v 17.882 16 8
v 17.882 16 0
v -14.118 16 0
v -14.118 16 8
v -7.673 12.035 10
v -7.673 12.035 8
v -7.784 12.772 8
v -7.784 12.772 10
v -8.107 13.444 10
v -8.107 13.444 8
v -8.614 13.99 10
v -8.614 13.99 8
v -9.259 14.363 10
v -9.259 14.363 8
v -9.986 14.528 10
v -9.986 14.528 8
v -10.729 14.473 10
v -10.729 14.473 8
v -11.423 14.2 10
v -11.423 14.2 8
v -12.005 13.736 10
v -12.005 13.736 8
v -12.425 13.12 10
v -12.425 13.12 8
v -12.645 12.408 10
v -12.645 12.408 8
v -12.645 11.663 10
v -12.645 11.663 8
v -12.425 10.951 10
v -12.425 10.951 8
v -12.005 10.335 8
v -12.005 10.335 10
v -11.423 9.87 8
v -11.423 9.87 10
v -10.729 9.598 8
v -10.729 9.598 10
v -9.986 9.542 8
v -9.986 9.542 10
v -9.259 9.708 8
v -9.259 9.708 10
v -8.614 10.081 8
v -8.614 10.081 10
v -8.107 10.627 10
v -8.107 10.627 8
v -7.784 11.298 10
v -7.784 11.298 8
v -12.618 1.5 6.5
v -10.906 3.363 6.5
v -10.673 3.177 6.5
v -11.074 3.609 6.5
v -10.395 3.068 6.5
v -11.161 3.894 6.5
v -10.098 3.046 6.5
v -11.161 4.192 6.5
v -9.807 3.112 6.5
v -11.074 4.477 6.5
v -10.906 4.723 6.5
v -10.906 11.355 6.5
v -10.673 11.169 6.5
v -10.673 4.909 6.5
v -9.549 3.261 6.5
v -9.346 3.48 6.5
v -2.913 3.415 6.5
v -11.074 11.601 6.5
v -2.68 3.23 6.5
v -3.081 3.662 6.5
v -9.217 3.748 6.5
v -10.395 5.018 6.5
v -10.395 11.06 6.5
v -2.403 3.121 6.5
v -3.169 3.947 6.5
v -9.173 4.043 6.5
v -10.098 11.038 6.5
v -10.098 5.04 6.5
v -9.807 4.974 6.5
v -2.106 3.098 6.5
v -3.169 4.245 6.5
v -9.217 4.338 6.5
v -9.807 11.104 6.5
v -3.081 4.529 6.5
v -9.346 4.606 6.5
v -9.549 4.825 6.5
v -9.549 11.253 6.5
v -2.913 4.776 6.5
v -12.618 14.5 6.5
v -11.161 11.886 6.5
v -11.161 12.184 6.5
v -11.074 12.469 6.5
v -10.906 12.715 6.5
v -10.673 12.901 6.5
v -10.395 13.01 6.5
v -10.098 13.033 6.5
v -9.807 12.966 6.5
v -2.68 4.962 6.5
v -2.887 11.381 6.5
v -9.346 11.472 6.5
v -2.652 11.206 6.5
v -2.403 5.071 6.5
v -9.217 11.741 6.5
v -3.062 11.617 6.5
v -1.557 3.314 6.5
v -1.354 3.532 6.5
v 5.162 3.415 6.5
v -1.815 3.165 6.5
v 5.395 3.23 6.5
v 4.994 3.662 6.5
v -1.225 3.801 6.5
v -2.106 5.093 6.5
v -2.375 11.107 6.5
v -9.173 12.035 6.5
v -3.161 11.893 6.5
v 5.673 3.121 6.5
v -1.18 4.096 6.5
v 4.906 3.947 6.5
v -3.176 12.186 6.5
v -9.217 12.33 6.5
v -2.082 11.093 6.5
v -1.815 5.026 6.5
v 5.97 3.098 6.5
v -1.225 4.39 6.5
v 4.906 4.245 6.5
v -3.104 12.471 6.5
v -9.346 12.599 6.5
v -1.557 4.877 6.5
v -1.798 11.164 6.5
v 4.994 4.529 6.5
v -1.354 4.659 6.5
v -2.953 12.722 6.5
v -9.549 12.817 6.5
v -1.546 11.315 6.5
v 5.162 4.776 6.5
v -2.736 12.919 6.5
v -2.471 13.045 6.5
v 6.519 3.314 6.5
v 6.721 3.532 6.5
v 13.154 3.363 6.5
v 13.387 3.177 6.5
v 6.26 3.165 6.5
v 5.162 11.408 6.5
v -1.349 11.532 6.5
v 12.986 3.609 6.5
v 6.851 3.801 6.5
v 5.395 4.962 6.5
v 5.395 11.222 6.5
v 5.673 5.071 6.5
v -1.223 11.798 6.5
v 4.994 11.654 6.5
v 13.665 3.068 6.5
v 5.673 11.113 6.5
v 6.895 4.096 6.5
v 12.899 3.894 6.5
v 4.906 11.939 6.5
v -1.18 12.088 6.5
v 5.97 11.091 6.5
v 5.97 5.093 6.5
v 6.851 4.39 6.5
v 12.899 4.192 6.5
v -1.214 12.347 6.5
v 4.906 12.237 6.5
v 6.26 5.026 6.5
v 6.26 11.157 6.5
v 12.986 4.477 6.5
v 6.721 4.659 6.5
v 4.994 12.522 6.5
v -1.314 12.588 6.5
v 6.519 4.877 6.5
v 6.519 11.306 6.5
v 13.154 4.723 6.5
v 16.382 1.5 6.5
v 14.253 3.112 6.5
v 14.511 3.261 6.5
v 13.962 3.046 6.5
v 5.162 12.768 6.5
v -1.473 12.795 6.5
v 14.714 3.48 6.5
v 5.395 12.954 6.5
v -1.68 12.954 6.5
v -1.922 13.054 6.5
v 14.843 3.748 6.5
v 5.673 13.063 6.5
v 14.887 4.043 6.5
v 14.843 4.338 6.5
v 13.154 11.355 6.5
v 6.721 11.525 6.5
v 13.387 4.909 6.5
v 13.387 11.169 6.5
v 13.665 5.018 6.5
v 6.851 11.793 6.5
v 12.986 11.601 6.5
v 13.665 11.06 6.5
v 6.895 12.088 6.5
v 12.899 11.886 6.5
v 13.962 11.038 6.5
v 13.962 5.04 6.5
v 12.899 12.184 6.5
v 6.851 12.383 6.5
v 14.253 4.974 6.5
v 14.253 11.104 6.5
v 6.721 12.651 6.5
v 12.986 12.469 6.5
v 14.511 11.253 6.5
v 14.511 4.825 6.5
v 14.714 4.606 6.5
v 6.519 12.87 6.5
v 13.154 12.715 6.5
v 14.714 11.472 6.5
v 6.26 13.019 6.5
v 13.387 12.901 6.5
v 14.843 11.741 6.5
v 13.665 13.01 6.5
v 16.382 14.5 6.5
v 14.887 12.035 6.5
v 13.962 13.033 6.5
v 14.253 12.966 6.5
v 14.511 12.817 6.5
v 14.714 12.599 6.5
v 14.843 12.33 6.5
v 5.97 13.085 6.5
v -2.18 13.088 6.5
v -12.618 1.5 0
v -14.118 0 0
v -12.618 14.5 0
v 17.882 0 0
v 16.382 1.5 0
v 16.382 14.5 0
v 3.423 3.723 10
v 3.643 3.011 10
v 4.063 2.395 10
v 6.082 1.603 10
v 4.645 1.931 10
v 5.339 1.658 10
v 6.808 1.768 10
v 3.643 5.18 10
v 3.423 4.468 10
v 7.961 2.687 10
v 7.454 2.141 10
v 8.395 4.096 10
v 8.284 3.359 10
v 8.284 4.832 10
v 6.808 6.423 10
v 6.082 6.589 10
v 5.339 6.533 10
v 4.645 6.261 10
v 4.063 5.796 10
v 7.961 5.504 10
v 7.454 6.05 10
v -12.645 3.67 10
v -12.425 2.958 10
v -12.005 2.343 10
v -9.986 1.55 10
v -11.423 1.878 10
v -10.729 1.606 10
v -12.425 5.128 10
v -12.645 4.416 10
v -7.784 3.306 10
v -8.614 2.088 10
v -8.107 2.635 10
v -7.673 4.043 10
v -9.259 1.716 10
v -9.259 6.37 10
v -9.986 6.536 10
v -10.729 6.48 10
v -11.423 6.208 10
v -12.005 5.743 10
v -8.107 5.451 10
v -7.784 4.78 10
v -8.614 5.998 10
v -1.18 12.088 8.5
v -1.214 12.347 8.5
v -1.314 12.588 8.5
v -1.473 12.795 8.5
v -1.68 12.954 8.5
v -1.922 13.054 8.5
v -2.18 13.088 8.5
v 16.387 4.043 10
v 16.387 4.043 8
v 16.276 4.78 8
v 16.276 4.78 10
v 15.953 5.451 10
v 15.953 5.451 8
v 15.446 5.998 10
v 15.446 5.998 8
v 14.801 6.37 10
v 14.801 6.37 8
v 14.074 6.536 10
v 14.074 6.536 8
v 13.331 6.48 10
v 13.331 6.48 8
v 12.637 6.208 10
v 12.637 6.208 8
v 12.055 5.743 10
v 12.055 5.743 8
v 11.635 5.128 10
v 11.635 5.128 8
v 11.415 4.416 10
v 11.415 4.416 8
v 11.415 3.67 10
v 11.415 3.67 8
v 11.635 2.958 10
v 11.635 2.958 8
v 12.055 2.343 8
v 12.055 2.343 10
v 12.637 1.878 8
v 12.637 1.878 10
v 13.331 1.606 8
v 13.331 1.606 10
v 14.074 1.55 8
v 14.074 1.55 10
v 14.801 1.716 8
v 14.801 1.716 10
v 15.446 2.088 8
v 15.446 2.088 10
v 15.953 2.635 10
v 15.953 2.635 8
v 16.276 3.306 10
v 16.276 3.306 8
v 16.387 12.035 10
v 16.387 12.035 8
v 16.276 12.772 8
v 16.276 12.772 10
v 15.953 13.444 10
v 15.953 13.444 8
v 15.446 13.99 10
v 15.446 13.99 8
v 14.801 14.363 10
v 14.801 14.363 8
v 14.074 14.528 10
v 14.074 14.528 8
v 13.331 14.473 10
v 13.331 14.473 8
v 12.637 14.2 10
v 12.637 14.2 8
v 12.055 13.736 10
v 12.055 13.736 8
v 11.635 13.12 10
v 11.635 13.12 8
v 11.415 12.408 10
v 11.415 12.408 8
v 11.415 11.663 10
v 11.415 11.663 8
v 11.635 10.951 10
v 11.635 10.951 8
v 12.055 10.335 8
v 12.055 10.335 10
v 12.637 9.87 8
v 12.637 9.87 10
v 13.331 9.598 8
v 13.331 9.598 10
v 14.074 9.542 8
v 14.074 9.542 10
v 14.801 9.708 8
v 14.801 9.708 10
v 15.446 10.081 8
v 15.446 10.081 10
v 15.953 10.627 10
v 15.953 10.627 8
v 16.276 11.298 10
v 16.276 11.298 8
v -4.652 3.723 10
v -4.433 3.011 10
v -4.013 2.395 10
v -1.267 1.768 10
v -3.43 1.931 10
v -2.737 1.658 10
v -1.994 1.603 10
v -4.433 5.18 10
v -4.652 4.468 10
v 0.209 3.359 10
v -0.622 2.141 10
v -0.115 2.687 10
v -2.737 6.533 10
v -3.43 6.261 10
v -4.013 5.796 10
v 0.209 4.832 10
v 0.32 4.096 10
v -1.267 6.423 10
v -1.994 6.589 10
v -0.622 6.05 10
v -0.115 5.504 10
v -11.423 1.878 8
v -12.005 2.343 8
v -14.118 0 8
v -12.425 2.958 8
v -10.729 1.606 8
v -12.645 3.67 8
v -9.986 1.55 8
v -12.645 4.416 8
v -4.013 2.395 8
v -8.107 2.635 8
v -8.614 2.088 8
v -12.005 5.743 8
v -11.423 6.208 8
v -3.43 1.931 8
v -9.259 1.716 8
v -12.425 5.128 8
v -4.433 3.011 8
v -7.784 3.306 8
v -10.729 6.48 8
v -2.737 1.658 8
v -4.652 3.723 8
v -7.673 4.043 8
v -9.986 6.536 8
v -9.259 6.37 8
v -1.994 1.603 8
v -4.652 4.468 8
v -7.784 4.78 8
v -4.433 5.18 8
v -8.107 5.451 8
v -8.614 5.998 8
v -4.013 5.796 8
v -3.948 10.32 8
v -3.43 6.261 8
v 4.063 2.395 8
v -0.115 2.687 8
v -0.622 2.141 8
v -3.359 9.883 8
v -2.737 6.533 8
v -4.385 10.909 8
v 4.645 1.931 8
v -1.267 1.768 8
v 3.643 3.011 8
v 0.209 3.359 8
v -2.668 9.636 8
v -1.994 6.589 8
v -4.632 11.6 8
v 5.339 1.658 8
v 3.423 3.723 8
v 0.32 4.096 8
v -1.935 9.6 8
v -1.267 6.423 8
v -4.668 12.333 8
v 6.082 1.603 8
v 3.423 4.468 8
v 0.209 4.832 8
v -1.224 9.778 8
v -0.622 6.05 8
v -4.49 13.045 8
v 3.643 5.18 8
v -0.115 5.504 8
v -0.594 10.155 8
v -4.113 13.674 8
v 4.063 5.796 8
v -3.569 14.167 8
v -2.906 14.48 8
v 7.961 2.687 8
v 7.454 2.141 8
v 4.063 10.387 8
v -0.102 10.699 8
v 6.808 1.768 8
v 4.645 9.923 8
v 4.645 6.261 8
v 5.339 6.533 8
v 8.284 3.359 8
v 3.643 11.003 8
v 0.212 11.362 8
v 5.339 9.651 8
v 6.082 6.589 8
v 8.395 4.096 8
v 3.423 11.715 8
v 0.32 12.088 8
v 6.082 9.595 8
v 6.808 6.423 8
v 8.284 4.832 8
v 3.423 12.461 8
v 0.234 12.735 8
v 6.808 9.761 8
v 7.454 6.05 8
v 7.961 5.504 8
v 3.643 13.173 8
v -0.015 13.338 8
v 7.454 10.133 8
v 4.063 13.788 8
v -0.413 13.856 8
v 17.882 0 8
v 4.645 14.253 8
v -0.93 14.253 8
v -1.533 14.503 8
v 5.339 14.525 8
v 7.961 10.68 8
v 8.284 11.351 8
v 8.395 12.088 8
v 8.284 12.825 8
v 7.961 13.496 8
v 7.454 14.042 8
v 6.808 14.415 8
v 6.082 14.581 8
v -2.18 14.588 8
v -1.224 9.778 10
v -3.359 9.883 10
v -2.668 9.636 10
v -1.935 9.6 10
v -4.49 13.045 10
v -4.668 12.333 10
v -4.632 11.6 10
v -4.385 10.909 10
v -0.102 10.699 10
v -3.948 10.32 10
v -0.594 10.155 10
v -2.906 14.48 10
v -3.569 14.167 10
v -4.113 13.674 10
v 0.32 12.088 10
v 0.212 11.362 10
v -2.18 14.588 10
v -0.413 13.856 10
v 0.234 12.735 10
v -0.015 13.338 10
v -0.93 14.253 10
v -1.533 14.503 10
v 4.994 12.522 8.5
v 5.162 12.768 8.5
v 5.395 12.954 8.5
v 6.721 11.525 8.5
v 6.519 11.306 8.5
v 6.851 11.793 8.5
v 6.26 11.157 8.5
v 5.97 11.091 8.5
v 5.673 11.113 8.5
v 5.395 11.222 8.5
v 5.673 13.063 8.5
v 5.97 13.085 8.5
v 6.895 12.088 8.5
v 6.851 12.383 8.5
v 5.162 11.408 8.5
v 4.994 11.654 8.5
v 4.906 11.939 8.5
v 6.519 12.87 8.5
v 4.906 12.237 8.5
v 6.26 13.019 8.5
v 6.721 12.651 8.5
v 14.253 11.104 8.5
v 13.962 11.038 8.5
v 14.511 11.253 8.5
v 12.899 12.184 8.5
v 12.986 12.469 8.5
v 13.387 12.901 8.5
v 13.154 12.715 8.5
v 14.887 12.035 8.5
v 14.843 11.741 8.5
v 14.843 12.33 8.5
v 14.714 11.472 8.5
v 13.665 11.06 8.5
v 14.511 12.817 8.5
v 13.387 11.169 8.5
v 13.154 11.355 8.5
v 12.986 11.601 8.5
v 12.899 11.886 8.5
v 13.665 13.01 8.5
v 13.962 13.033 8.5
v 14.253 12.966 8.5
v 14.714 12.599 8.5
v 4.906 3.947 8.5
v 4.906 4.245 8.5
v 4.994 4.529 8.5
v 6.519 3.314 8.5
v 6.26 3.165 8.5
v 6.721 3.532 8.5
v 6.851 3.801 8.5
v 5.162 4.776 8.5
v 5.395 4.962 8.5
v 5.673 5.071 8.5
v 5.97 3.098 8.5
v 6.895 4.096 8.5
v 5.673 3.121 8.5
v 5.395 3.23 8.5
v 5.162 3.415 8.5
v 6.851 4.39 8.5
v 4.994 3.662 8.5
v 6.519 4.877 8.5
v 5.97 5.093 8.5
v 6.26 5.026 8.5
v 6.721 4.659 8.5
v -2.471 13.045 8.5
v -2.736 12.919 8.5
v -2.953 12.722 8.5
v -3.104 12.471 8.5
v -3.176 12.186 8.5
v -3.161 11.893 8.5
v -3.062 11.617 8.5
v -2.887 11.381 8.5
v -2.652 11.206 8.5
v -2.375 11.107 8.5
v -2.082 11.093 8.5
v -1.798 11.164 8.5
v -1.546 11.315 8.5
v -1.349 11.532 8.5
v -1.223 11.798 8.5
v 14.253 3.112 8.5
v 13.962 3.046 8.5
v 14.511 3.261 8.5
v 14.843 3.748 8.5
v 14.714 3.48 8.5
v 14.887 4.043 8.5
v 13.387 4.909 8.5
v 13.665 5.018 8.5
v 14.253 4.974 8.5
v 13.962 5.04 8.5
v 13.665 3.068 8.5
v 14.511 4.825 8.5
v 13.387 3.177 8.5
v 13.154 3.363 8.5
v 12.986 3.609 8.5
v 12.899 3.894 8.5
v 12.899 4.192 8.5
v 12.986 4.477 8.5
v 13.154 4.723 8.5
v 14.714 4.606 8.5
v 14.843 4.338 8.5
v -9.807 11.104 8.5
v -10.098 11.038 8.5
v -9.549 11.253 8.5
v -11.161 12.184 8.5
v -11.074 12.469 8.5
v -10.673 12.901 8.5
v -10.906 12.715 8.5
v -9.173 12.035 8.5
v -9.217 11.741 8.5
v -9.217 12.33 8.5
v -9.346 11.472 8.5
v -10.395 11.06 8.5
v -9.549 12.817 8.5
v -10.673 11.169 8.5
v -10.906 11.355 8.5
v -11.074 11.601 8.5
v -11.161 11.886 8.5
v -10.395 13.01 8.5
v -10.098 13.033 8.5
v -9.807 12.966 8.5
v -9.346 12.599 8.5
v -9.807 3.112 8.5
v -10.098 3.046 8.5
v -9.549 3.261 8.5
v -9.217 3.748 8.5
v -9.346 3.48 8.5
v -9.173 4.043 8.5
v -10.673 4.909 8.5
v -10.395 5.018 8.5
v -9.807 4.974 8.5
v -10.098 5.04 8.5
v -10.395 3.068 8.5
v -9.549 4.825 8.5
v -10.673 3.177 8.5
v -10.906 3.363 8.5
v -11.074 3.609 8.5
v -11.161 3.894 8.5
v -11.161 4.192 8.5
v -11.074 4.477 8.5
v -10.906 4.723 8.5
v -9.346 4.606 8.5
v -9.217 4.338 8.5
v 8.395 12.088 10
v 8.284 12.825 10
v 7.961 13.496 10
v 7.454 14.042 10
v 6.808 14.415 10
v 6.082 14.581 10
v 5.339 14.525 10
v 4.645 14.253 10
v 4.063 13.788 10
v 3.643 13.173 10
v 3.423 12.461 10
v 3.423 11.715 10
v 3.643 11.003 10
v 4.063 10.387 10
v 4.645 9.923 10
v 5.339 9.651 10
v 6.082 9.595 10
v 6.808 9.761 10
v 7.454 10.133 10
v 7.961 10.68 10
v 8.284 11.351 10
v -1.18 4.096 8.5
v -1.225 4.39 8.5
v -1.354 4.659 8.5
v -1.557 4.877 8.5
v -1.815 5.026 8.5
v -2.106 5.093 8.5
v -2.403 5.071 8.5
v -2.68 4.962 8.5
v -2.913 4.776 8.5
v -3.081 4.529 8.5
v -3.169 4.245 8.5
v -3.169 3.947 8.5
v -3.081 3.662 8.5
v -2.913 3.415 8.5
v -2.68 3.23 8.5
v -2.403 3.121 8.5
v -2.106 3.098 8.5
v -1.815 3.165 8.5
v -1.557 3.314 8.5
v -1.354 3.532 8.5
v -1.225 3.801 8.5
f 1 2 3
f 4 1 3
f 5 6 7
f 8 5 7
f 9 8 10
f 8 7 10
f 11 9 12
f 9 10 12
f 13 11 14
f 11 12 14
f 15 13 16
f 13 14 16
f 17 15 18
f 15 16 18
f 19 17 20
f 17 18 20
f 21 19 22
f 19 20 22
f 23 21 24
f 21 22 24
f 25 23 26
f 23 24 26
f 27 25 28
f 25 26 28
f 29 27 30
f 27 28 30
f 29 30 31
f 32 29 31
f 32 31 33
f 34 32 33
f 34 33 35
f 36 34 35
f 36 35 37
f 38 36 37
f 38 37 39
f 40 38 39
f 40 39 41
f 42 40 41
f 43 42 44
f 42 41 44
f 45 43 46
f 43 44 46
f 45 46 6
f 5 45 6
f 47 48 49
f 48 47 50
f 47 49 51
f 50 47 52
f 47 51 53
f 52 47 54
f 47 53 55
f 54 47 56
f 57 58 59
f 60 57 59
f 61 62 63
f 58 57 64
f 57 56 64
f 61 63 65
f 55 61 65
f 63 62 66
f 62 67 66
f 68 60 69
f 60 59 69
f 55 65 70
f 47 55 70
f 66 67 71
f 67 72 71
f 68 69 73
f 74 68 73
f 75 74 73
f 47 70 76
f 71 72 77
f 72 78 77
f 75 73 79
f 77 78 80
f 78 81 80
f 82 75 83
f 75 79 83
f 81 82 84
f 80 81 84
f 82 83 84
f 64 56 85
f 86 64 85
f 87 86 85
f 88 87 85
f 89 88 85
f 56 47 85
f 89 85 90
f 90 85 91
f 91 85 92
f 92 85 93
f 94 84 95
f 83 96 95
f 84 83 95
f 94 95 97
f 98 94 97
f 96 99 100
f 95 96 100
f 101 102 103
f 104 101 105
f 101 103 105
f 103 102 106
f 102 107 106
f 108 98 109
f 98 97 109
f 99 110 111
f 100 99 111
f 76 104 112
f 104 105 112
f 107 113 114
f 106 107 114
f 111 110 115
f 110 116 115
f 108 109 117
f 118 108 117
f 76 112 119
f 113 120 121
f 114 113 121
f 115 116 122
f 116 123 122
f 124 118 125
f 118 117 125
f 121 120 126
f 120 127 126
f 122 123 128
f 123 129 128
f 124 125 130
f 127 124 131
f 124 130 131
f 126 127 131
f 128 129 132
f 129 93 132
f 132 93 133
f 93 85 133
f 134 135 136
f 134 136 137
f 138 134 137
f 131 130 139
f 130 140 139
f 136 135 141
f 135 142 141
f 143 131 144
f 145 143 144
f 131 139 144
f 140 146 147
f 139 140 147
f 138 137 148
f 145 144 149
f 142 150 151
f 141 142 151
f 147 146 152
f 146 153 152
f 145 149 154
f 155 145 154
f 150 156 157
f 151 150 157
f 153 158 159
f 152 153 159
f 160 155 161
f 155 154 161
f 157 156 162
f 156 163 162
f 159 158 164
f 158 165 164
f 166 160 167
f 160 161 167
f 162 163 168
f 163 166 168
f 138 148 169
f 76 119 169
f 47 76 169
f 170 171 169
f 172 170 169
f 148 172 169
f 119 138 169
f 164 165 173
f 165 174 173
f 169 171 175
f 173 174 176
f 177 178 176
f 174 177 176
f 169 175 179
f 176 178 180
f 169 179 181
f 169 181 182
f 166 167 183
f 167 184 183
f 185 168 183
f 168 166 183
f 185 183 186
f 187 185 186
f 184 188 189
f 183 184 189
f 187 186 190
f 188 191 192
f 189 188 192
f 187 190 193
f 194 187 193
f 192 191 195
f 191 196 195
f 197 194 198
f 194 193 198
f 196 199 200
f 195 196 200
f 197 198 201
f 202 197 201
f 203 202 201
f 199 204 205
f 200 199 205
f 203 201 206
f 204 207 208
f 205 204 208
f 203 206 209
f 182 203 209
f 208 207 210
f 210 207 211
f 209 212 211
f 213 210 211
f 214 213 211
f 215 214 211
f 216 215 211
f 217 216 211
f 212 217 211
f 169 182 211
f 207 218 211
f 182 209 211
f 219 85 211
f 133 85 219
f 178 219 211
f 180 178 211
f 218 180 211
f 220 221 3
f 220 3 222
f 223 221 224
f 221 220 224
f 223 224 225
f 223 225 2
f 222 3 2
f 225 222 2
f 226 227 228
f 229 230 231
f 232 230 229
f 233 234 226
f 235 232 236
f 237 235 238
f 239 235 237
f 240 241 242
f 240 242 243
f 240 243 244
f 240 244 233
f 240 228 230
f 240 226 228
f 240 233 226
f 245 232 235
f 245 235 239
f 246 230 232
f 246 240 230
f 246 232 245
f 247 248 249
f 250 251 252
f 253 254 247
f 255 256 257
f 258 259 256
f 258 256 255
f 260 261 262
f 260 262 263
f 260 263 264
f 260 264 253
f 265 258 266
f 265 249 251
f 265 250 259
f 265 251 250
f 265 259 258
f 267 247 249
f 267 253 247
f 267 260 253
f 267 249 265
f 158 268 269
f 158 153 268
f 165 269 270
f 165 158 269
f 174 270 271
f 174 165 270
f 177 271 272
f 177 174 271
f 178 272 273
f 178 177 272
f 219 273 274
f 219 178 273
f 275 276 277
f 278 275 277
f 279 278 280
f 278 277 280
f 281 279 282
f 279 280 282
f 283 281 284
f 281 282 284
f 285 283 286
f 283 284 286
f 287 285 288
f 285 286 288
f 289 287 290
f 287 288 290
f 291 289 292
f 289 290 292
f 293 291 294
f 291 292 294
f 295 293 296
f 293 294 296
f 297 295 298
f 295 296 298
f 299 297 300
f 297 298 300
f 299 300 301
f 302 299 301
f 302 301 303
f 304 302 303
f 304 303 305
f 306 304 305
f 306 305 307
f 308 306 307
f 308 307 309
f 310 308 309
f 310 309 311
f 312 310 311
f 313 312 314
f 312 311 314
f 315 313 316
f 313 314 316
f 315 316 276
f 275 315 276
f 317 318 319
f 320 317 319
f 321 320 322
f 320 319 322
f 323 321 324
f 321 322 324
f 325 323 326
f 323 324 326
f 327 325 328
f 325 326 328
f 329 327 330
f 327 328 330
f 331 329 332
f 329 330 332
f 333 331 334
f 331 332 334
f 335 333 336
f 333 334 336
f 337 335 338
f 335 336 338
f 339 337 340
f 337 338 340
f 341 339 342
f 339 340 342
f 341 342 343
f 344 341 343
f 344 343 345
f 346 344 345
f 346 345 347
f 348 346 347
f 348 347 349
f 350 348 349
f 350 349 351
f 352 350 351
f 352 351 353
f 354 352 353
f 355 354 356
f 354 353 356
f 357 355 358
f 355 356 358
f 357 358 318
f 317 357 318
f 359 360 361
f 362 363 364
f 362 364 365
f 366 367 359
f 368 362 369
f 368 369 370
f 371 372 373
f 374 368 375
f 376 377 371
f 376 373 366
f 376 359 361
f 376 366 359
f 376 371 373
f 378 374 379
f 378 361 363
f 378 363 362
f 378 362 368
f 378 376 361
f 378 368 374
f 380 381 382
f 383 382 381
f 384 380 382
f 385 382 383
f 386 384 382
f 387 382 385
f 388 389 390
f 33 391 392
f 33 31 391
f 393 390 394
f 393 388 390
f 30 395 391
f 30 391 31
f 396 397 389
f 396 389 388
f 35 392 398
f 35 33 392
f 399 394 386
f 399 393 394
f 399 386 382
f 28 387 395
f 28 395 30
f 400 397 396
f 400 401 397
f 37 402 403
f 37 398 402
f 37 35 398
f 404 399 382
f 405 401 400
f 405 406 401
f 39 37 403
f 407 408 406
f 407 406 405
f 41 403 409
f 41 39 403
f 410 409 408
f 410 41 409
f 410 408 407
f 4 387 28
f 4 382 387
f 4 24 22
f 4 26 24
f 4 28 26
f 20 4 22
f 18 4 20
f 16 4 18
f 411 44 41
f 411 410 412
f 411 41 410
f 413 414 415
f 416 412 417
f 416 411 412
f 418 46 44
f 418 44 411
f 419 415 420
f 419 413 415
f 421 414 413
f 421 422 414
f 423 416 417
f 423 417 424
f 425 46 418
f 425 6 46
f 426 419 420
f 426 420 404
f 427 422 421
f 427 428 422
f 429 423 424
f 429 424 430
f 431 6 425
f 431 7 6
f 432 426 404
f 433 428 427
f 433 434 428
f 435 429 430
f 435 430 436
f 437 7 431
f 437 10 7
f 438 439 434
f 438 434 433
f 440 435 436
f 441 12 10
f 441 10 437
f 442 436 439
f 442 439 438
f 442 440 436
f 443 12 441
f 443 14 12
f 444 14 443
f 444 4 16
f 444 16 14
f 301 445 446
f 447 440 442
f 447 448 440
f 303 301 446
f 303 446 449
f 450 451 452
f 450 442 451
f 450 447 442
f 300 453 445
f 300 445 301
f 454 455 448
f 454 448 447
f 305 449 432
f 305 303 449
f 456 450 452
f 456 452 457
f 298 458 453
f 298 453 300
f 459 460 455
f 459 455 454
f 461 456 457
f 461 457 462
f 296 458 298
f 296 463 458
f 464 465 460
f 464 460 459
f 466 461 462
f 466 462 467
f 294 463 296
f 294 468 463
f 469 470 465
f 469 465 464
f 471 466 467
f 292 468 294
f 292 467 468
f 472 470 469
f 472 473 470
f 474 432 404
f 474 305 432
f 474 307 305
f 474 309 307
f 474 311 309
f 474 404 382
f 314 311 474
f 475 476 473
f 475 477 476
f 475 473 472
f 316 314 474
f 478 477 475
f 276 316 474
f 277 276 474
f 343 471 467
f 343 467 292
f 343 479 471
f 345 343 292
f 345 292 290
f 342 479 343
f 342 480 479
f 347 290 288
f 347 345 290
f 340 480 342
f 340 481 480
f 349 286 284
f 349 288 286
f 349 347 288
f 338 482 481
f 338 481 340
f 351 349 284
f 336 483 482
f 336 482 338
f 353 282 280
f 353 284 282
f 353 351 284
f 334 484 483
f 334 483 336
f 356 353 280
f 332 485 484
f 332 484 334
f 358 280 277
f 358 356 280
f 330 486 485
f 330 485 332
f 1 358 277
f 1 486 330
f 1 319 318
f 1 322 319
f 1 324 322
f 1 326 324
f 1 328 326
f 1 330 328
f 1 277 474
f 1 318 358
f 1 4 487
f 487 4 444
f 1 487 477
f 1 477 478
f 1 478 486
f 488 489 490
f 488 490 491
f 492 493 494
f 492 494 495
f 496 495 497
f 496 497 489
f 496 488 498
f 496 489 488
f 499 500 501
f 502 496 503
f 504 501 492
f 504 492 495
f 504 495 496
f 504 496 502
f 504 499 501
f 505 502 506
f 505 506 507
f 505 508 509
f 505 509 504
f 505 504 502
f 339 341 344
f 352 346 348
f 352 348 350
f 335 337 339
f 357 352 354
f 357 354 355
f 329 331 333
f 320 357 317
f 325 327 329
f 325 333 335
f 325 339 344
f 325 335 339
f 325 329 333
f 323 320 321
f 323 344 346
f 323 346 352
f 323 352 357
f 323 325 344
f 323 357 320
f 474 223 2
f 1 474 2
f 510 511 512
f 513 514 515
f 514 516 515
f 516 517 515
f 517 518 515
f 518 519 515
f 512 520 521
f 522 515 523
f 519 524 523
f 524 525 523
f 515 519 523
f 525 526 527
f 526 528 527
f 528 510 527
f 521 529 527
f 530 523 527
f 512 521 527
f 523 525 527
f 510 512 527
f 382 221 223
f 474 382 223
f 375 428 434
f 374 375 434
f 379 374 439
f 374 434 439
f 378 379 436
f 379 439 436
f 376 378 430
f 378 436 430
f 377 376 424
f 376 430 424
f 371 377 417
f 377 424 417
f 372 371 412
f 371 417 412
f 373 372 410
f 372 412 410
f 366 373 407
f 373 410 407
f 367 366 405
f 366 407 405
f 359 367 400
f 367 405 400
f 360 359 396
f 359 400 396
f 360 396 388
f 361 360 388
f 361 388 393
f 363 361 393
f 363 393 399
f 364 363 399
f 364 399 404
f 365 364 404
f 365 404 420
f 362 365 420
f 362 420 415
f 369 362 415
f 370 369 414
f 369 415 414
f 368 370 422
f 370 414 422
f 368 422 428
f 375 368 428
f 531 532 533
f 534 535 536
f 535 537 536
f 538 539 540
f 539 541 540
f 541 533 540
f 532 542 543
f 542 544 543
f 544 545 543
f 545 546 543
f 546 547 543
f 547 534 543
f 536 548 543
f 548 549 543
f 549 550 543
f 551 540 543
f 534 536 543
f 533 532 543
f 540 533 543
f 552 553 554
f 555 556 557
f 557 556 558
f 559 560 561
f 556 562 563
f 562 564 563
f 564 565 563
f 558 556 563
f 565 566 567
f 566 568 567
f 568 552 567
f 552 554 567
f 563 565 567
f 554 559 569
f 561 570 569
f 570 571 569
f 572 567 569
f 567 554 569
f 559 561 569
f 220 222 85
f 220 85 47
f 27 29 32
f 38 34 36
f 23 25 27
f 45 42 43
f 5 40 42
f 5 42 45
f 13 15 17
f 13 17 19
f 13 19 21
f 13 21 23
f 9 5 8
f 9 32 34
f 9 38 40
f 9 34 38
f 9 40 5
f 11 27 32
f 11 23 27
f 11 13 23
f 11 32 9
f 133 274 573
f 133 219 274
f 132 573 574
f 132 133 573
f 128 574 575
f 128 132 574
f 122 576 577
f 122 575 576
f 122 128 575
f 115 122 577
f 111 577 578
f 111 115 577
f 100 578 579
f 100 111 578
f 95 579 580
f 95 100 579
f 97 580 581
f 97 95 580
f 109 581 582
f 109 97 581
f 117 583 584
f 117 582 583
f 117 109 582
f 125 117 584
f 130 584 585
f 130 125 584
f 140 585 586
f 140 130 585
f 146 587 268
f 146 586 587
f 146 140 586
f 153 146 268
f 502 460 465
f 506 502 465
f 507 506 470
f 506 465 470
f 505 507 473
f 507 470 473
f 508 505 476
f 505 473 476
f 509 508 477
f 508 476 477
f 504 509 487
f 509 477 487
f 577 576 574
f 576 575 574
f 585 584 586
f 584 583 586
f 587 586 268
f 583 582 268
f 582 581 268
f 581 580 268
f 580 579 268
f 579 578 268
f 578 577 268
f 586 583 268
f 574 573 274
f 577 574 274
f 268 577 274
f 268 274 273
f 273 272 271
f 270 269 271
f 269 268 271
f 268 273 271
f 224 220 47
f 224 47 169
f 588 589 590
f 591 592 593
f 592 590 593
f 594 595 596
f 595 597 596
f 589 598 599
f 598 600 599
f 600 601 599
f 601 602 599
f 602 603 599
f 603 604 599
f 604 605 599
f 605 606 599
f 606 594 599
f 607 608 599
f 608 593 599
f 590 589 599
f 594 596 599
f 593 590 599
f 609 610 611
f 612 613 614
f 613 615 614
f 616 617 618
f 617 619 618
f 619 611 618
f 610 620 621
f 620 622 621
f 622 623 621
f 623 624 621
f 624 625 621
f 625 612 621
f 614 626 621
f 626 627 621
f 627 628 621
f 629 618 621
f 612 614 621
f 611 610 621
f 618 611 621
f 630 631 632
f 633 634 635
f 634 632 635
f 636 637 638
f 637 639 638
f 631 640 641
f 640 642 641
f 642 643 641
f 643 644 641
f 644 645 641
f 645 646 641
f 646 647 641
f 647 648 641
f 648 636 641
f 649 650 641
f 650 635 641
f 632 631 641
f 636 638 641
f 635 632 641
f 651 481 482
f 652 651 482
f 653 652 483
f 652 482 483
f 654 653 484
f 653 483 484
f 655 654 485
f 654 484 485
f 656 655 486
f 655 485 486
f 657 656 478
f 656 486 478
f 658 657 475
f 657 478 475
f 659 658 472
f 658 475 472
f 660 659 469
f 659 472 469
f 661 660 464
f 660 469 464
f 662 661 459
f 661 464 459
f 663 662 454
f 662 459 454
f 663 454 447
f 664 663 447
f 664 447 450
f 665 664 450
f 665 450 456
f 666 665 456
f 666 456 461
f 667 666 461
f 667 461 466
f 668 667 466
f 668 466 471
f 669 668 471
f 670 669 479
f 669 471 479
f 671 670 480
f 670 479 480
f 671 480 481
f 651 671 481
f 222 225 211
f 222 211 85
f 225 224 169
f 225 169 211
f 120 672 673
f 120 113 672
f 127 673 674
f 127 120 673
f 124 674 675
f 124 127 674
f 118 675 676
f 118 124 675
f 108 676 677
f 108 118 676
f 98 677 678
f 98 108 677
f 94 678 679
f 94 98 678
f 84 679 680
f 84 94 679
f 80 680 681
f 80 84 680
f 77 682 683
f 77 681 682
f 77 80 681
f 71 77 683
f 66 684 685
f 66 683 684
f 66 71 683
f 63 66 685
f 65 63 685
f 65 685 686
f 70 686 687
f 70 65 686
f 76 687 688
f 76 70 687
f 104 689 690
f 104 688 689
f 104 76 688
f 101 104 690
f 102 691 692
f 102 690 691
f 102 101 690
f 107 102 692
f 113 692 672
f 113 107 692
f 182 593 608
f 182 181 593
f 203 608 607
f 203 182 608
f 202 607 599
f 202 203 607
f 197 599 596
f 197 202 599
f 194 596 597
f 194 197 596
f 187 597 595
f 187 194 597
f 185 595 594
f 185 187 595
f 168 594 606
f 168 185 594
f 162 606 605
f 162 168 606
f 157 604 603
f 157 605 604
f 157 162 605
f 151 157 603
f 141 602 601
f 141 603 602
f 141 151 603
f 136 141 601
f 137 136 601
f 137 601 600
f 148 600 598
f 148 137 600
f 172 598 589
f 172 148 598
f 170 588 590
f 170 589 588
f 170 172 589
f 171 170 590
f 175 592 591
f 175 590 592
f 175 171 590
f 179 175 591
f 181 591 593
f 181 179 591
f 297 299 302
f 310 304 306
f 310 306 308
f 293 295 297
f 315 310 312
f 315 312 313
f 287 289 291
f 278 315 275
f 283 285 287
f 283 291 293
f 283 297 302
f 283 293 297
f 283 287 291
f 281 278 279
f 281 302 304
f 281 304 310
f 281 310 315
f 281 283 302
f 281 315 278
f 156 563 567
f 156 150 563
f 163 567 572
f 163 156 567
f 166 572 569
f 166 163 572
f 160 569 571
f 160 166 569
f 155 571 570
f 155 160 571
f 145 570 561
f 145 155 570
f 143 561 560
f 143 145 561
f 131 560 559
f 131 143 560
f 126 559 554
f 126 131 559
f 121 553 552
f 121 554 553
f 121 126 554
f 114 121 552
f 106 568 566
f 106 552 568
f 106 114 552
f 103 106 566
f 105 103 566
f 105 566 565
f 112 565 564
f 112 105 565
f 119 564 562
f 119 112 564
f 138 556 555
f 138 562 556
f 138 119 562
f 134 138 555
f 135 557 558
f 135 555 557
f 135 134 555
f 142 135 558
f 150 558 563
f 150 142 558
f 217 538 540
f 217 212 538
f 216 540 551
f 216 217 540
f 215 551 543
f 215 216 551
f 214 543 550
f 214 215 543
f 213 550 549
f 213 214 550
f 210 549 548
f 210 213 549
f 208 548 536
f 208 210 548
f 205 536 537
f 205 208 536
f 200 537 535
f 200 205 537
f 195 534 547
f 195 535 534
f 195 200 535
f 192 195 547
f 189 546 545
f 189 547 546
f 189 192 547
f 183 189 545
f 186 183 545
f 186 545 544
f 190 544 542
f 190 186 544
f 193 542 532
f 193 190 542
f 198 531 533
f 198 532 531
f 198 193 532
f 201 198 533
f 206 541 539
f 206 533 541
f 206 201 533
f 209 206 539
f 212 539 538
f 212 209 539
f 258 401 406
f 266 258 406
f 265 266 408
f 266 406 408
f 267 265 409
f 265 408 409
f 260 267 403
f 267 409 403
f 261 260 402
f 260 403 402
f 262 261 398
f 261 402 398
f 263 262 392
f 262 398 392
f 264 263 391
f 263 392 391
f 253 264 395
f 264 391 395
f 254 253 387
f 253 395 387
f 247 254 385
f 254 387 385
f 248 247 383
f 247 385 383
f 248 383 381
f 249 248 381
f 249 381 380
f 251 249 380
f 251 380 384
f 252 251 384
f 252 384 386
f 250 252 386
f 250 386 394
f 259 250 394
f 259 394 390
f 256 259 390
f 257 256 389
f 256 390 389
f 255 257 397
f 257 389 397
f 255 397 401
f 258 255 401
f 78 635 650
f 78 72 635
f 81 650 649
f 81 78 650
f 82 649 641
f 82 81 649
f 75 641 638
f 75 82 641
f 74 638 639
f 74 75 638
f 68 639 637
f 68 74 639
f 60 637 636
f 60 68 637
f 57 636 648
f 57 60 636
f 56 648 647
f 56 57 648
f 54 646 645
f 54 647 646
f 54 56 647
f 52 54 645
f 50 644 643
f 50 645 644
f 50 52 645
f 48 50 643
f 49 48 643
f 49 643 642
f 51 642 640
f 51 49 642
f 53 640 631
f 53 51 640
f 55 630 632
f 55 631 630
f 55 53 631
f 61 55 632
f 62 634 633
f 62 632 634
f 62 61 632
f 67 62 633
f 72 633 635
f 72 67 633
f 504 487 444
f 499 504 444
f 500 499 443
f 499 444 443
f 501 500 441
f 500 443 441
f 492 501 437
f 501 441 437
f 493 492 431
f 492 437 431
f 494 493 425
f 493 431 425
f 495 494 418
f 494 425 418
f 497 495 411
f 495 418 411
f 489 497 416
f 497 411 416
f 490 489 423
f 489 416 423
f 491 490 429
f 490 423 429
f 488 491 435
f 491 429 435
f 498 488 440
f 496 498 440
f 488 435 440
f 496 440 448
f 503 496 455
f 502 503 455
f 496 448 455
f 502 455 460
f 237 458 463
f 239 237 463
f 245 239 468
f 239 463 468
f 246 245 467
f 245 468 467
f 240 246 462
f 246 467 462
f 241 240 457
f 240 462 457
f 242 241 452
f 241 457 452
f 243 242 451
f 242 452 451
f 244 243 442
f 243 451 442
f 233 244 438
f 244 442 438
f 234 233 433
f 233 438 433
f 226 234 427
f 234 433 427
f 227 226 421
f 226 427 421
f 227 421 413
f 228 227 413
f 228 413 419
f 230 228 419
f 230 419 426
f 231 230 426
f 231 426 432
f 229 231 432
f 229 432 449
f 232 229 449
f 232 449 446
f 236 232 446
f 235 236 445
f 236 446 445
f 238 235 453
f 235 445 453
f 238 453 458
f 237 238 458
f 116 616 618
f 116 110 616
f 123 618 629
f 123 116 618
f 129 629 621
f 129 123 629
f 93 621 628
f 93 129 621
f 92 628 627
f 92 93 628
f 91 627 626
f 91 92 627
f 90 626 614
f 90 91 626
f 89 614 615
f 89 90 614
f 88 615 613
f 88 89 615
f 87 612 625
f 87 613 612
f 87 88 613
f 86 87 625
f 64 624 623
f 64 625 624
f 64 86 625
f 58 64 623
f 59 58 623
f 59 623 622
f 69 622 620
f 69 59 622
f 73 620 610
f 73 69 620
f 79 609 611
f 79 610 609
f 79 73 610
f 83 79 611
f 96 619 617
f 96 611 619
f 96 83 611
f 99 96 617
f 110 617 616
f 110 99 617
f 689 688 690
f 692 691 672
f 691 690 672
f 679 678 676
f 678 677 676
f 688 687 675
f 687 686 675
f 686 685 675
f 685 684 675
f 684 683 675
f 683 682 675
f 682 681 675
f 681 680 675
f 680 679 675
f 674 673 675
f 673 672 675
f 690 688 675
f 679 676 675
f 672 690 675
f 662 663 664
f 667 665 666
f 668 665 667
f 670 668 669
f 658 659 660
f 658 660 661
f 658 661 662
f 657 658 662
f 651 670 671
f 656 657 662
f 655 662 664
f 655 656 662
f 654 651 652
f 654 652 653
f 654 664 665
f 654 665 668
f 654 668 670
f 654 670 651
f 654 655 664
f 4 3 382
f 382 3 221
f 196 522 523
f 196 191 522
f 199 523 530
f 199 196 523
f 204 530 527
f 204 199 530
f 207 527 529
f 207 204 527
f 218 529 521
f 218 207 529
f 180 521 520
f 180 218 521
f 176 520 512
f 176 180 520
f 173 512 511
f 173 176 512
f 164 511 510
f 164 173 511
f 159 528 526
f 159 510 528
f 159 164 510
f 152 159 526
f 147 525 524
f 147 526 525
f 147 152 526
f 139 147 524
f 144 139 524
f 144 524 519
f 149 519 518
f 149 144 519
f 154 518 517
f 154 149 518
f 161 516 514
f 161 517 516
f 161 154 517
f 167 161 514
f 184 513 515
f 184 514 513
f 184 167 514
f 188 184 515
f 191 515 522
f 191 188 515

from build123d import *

# Parameters (mm, degrees)
F1_DEPTH = 8
F3_R     = 2.5
F4_DEPTH = 2
F5_T     = -1.5


with BuildPart() as f1:
    # F0 (on Top) → F1 (new body)
    with BuildSketch(Plane.XY):
        Polygon((-14.1176469211, 8), (-14.1176469211, 0), (1.8823530789, 0), (8.3823530789, 0), (9.1710221022, 0), (17.8823530789, 0), (17.8823530789, 7.8231371145), (17.8823530789, 8.2882069845), (17.8823530789, 16), (-14.1176469211, 16), (-14.1176469211, 8.0556720495), align=None)
    extrude(amount=F1_DEPTH)

    # F3 (on offset) → F4 (join)
    with BuildSketch(Plane.XY.offset(8)):
        with Locations((-10.1726641878, 12.0353270322)):
            Circle(F3_R)
        with Locations((-10.1726641878, 4.043020308)):
            Circle(F3_R)
        with Locations((-2.180356998, 4.0956009179)):
            Circle(F3_R)
        with BuildLine():
            ThreePointArc((-2.180356998, 14.5879076421), (-3.948123951, 10.3201406892), (0.319643002, 12.0879076421))
            ThreePointArc((0.319643002, 12.0879076421), (-0.412590045, 13.8556745951), (-2.180356998, 14.5879076421))
        make_face()
        with Locations((5.8951441832, 12.0879076421)):
            Circle(F3_R)
        with Locations((5.8951441832, 4.0956009179)):
            Circle(F3_R)
        with Locations((13.887451373, 4.043020308)):
            Circle(F3_R)
        with Locations((13.887451373, 12.0353270322)):
            Circle(F3_R)
    extrude(amount=F4_DEPTH)

    # F5
    f5_openings = [f1.faces().sort_by_distance(p)[0] for p in [
        (1.882353, 8, 0),
    ]]
    offset(amount=F5_T, openings=f5_openings, kind=Kind.INTERSECTION)


solid = f1.part
